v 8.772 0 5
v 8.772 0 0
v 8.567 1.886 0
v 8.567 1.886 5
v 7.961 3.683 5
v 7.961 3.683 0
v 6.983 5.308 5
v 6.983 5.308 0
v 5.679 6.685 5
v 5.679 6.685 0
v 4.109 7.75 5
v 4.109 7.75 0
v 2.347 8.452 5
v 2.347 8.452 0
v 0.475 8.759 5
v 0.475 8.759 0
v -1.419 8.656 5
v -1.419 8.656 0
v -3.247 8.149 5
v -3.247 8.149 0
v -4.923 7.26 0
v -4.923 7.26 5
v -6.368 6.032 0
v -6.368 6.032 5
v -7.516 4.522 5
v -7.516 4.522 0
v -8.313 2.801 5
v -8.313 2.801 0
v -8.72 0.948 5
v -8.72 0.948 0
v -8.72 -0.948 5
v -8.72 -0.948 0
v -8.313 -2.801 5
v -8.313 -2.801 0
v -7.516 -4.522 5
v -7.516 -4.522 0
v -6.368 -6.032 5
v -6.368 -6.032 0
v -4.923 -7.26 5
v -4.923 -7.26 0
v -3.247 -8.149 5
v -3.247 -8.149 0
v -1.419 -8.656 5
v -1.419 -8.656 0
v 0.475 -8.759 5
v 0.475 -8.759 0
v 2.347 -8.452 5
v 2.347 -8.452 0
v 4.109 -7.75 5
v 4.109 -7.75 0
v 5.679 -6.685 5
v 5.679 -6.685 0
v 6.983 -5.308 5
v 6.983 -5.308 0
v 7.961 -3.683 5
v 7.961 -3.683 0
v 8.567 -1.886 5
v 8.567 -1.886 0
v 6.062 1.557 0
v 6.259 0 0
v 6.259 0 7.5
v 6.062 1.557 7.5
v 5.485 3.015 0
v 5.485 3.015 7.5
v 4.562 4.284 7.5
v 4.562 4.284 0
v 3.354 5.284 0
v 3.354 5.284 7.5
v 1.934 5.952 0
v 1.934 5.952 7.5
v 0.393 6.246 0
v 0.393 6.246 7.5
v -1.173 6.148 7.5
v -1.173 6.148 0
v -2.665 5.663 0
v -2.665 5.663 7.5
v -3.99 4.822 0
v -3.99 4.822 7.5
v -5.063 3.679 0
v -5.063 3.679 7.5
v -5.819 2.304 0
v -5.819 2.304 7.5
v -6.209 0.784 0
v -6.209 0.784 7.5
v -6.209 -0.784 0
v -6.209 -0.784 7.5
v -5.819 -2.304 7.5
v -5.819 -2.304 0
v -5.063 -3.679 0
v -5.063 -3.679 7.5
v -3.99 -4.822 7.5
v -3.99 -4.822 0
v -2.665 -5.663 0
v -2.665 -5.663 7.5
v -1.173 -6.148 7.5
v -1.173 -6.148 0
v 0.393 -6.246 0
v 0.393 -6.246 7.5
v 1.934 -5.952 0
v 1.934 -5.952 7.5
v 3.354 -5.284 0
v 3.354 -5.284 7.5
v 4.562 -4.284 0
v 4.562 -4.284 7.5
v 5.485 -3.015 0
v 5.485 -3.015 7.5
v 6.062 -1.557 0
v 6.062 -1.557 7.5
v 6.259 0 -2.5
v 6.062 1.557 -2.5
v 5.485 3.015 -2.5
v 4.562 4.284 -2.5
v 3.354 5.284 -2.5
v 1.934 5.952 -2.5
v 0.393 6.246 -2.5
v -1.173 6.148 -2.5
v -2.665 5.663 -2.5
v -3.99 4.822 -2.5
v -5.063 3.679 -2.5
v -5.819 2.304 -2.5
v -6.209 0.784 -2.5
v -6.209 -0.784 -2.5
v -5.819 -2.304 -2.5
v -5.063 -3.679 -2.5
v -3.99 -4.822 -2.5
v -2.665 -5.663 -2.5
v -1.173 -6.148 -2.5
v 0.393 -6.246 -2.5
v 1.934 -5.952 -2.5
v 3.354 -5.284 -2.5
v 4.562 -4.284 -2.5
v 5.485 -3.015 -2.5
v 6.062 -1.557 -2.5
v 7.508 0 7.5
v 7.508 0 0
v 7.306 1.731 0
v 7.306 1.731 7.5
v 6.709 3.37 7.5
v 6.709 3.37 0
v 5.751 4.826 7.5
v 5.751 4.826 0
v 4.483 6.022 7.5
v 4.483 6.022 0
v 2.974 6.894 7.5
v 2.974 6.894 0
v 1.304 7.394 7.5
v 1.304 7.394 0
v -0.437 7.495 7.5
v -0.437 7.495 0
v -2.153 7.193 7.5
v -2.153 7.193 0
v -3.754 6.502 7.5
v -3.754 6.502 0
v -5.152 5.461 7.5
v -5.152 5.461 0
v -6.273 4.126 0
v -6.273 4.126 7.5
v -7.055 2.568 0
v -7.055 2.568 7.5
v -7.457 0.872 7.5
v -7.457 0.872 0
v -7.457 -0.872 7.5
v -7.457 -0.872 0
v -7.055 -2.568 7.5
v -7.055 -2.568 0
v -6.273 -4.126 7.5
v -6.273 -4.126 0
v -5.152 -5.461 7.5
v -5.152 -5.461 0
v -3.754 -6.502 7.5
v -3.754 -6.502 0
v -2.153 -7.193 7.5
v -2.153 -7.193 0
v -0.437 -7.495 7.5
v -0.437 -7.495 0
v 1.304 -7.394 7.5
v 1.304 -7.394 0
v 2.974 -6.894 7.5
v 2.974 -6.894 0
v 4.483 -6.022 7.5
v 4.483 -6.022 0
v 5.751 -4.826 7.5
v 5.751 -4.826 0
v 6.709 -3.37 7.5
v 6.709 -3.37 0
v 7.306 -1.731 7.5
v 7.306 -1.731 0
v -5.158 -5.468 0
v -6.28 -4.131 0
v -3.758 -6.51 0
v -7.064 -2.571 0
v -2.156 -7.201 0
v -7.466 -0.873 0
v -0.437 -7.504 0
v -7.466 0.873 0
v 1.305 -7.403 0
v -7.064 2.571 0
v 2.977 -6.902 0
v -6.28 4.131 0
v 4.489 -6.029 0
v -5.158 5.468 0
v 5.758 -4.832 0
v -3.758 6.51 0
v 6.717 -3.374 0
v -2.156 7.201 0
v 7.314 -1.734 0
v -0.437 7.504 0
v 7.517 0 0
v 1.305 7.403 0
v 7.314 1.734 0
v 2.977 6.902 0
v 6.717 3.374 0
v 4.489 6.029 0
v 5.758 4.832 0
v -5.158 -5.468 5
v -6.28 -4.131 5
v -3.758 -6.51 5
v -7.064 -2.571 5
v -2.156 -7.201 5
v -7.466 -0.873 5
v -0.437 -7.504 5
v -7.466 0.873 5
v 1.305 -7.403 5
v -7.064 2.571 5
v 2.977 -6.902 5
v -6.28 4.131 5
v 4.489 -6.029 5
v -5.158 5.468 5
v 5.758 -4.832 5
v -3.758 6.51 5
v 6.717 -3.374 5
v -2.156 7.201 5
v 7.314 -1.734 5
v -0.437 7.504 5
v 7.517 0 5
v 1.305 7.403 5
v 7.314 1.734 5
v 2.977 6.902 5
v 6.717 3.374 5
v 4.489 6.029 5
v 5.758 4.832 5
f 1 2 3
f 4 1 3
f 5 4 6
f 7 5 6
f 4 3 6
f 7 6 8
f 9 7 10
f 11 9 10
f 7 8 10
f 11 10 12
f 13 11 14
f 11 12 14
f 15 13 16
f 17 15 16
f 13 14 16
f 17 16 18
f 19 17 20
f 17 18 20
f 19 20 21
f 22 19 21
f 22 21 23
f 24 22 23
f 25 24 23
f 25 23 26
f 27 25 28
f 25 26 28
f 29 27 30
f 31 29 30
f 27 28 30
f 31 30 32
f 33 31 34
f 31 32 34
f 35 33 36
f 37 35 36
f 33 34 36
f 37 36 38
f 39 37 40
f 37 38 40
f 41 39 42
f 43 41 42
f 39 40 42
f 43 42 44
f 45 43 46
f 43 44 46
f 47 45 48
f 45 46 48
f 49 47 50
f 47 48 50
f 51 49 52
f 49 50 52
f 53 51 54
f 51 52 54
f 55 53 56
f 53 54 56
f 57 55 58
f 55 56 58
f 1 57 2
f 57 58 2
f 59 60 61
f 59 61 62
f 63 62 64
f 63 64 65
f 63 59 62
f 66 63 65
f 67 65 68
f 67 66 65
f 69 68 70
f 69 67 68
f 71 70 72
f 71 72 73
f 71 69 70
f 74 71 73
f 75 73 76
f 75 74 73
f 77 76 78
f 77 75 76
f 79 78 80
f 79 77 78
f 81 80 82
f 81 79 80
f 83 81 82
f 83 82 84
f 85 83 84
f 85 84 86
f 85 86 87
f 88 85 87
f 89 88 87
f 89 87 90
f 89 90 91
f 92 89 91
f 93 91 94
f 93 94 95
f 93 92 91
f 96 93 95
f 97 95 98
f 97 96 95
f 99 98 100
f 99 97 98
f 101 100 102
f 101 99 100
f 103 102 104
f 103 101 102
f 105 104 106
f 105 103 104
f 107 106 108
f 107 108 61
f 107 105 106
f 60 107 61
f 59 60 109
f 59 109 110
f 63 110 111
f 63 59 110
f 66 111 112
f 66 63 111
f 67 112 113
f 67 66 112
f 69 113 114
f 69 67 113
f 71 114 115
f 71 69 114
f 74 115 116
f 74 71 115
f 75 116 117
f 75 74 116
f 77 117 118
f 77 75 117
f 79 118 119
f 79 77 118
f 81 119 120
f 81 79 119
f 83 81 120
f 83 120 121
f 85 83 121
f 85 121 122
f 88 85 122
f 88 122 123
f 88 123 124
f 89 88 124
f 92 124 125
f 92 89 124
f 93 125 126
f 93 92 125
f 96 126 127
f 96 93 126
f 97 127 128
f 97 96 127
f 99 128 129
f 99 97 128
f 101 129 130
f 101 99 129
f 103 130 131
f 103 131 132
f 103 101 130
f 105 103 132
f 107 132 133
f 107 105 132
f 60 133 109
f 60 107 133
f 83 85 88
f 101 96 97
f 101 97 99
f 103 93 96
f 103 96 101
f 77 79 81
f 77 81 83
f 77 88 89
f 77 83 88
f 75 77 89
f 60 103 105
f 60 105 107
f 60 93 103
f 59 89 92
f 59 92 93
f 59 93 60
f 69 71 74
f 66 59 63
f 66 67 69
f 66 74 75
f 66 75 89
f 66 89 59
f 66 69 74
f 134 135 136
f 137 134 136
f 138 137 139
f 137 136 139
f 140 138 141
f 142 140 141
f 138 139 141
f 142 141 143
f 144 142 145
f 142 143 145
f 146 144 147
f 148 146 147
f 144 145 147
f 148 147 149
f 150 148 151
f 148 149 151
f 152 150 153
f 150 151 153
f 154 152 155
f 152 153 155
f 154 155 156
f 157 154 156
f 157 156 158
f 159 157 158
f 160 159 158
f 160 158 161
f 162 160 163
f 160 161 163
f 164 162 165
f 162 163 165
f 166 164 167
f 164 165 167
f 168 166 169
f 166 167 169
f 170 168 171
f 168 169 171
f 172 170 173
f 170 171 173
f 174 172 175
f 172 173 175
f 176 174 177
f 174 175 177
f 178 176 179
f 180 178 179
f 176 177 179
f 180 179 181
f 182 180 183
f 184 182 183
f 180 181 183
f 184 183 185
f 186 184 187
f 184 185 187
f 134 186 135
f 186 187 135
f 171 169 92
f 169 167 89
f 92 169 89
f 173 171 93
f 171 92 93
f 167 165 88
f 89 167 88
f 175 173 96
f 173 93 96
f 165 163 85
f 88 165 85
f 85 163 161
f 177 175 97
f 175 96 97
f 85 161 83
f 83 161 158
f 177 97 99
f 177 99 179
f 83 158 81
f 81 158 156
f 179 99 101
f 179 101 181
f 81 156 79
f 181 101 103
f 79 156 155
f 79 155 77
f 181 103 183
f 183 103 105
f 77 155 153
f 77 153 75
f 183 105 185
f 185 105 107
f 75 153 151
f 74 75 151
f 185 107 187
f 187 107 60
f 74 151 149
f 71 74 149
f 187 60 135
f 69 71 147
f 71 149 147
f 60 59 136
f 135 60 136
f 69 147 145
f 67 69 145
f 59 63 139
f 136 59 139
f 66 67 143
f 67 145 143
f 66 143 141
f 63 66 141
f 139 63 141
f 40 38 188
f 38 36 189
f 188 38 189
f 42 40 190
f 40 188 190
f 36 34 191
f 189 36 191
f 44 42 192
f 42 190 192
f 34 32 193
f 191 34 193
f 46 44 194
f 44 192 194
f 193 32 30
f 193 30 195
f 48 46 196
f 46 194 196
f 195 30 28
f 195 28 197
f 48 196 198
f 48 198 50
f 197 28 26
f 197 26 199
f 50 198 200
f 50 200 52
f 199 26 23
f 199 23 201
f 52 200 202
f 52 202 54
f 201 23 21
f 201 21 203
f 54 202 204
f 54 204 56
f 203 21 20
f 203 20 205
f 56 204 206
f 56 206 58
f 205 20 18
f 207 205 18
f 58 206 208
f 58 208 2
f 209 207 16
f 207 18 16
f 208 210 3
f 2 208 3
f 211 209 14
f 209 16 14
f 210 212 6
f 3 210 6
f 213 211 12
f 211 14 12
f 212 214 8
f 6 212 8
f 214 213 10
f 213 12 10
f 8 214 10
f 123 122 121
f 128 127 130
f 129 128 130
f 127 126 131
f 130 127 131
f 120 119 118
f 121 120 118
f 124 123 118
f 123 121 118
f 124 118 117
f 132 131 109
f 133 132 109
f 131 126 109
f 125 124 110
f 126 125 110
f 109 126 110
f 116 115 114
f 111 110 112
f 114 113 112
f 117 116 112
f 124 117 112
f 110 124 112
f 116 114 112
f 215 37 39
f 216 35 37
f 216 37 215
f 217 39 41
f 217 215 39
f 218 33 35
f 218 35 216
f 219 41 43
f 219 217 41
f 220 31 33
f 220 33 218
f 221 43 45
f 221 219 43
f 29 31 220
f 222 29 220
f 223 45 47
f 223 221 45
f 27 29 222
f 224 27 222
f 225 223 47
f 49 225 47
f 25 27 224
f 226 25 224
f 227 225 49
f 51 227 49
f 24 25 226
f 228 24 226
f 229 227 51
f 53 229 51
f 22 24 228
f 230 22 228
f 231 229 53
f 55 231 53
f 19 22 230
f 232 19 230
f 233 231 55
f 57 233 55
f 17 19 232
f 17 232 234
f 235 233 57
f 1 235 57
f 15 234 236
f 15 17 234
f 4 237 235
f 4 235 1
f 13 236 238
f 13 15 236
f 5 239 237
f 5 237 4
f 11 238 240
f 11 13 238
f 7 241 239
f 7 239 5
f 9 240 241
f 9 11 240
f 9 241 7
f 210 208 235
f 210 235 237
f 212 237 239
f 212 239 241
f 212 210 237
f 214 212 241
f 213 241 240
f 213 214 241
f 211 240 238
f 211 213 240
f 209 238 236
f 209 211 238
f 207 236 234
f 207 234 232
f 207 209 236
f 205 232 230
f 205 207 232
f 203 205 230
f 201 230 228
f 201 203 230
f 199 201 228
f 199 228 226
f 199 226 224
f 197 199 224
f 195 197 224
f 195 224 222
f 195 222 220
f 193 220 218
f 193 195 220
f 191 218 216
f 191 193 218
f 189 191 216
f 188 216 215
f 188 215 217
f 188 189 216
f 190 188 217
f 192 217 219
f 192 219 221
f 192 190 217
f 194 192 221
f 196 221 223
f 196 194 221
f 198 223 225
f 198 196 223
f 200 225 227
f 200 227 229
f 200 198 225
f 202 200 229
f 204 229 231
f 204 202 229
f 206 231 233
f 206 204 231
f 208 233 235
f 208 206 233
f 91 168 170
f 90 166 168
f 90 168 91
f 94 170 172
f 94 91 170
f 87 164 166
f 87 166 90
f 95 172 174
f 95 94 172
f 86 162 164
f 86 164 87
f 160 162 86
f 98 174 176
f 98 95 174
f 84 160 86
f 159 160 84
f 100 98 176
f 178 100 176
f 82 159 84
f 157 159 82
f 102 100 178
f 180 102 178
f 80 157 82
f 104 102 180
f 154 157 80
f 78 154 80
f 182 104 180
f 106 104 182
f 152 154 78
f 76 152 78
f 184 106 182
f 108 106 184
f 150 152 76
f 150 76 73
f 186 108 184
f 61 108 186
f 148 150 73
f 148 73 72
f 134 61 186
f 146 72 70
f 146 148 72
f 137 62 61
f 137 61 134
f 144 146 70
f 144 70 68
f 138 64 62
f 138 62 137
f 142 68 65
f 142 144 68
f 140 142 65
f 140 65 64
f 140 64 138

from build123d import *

# Parameters (mm, degrees)
F0_R     = 8.771746
F0_R_2   = 7.516924
F1_DEPTH = 5
F0_R_3   = 7.507939
F0_R_4   = 6.258811
F2_DEPTH = 7.5
F3_DEPTH = 2.5


with BuildPart() as f1:
    # F0 (on Top) → F1 (new body)
    with BuildSketch(Plane.XY):
        Circle(F0_R)
        Circle(F0_R_2, mode=Mode.SUBTRACT)
    extrude(amount=F1_DEPTH)


with BuildPart() as f2:
    # F0 (on Top) → F2 (new body)
    with BuildSketch(Plane.XY):
        Circle(F0_R_3)
        Circle(F0_R_4, mode=Mode.SUBTRACT)
    extrude(amount=F2_DEPTH)


with BuildPart() as f3:
    # F0 (on Top) → F3 (new body)
    with BuildSketch(Plane.XY):
        Circle(F0_R_4)
    extrude(amount=-F3_DEPTH)


solid = Compound([f1.part, f2.part, f3.part])
